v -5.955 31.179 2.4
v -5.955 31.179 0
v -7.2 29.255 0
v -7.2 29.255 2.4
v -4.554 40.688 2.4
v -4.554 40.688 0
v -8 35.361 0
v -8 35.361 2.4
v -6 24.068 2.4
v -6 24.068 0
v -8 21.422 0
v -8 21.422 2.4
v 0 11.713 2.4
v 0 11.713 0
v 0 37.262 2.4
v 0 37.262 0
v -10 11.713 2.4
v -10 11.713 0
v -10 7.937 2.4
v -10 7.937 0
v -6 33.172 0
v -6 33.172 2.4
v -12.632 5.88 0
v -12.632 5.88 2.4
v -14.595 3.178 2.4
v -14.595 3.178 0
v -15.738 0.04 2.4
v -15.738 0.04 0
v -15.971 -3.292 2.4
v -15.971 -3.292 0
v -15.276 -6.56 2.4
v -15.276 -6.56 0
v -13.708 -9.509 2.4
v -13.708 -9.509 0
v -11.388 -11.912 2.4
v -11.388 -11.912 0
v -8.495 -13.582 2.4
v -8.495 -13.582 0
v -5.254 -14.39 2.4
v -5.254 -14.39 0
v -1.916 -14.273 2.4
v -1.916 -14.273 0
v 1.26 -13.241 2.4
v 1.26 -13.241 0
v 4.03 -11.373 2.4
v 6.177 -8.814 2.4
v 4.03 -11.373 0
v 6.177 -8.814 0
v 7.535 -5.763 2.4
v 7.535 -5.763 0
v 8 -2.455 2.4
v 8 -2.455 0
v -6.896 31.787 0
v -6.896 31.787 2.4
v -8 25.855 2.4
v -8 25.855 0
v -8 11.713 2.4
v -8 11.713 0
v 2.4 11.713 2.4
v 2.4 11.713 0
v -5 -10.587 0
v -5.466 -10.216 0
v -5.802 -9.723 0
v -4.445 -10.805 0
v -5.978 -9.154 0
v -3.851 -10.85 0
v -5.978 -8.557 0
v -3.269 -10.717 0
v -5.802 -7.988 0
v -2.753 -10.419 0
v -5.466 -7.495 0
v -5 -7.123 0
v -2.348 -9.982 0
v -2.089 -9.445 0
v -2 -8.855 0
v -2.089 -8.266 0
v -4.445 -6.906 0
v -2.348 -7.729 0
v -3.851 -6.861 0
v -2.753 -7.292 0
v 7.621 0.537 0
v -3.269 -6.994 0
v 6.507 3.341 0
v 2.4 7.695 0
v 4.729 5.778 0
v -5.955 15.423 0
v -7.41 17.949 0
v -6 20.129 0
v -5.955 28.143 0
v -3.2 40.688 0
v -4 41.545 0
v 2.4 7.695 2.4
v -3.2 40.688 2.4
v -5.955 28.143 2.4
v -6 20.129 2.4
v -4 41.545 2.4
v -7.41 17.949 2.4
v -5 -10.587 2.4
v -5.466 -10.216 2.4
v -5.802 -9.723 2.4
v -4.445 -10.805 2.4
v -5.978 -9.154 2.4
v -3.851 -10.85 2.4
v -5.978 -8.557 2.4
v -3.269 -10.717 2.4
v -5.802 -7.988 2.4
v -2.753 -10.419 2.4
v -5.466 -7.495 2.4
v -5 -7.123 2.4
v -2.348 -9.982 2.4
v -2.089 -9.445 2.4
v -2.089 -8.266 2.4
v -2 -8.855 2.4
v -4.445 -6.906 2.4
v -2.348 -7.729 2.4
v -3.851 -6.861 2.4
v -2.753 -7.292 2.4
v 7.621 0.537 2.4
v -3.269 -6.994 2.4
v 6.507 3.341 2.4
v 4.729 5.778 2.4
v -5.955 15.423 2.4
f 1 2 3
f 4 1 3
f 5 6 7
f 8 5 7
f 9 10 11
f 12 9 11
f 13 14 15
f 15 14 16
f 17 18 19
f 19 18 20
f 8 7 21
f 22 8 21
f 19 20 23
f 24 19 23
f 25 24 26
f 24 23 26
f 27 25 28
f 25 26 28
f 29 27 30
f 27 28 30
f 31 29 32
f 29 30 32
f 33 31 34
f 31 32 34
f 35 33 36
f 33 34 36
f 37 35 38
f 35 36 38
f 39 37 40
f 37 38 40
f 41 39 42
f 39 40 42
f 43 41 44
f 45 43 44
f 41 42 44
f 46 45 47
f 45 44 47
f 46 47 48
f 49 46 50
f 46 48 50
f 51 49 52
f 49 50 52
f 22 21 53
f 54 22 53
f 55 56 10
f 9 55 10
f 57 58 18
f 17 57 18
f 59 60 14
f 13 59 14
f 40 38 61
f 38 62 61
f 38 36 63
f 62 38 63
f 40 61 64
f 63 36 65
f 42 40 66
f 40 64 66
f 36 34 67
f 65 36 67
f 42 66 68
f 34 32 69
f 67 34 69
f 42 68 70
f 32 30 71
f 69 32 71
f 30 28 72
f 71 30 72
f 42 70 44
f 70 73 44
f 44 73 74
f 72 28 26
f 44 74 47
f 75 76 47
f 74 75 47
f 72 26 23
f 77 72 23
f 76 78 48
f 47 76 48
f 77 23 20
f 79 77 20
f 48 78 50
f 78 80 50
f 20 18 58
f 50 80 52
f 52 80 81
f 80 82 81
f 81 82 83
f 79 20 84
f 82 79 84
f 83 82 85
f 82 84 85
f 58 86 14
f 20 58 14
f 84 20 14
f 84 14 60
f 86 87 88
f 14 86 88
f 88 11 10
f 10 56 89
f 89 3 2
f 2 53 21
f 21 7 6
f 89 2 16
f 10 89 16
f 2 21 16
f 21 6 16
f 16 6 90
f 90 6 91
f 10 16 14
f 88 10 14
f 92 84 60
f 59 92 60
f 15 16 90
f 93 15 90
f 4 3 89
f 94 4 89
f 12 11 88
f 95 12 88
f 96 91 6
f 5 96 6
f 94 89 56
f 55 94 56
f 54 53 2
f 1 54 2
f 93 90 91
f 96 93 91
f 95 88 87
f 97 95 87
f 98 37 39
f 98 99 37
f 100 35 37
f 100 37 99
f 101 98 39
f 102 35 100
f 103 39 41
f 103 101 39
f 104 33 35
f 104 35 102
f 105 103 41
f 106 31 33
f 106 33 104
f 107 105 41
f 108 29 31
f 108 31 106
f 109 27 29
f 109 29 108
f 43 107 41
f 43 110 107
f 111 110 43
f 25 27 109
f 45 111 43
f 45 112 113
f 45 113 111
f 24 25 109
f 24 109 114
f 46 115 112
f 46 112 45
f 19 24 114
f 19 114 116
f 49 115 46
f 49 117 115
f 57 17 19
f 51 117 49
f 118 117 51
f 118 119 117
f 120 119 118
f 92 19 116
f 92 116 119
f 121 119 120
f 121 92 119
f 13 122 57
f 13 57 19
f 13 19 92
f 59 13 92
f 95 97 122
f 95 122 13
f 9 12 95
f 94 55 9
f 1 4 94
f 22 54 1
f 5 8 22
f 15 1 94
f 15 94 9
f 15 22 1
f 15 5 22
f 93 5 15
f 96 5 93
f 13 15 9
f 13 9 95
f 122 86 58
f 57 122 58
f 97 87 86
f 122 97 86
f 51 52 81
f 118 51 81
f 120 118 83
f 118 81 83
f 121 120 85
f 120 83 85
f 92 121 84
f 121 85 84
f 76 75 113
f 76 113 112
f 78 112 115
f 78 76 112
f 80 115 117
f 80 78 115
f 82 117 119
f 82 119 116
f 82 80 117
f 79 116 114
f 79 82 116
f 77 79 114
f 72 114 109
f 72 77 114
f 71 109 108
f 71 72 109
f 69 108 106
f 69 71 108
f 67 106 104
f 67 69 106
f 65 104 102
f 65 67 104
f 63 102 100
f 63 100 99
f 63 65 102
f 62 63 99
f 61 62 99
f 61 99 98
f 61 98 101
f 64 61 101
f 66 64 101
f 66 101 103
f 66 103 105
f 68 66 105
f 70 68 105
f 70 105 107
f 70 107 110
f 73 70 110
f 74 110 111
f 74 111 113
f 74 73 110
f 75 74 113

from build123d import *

# Parameters (mm, degrees)
F0_R     = 2
F1_DEPTH = 2.4


with BuildPart() as f1:
    # F0 (on Top) → F1 (new body)
    with BuildSketch(Plane.XY):
        Polygon((-5.955262, 15.422773), (-8, 11.712709), (-4.8, 11.712709), (-4.554067, 40.688071), (-8, 35.361156), (-6, 33.171624), (-6.895736, 31.786946), (-5.955262, 31.178562), (-7.199531, 29.255102), (-5.955262, 28.143108), (-8, 25.855143), (-6, 24.067757), (-8, 21.422476), (-6, 20.128694), (-7.410005, 17.94903), align=None)
        Polygon((-3.2, 11.712709), (0, 11.712709), (0, 37.262041), (-3.2, 40.688071), align=None)
        with BuildLine():
            Line((-10, 11.712709), (-10, 7.936883))
            ThreePointArc((-10, 7.936883), (-7.105829, 9.135688), (-4, 9.544578))
            Line((-4, 9.544578), (-4, 11.712709))
            Line((-4, 11.712709), (-4.8, 11.712709))
            Line((-4.8, 11.712709), (-8, 11.712709))
            Line((-8, 11.712709), (-10, 11.712709))
        make_face()
        with BuildLine():
            ThreePointArc((-4, 9.544578), (-0.66911, 9.073029), (2.4, 7.69544))
            Line((2.4, 7.69544), (2.4, 11.712709))
            Line((2.4, 11.712709), (0, 11.712709))
            Line((0, 11.712709), (-3.2, 11.712709))
            Line((-3.2, 11.712709), (-4, 11.712709))
            Line((-4, 11.712709), (-4, 9.544578))
        make_face()
        with BuildLine():
            ThreePointArc((-10, 7.936883), (-10, -12.847727), (8, -2.455422))
            ThreePointArc((8, -2.455422), (6.50714, 3.341129), (2.4, 7.69544))
            ThreePointArc((2.4, 7.69544), (-0.66911, 9.073029), (-4, 9.544578))
            ThreePointArc((-4, 9.544578), (-7.105829, 9.135688), (-10, 7.936883))
        make_face()
        with Locations((-4, -8.855422)):
            Circle(F0_R, mode=Mode.SUBTRACT)
        Polygon((-4, 41.544578), (-4, 11.712709), (-3.2, 11.712709), (-3.2, 40.688071), align=None)
        Polygon((-4.8, 11.712709), (-4, 11.712709), (-4, 41.544578), (-4.554067, 40.688071), align=None)
    extrude(amount=F1_DEPTH)


solid = f1.part
